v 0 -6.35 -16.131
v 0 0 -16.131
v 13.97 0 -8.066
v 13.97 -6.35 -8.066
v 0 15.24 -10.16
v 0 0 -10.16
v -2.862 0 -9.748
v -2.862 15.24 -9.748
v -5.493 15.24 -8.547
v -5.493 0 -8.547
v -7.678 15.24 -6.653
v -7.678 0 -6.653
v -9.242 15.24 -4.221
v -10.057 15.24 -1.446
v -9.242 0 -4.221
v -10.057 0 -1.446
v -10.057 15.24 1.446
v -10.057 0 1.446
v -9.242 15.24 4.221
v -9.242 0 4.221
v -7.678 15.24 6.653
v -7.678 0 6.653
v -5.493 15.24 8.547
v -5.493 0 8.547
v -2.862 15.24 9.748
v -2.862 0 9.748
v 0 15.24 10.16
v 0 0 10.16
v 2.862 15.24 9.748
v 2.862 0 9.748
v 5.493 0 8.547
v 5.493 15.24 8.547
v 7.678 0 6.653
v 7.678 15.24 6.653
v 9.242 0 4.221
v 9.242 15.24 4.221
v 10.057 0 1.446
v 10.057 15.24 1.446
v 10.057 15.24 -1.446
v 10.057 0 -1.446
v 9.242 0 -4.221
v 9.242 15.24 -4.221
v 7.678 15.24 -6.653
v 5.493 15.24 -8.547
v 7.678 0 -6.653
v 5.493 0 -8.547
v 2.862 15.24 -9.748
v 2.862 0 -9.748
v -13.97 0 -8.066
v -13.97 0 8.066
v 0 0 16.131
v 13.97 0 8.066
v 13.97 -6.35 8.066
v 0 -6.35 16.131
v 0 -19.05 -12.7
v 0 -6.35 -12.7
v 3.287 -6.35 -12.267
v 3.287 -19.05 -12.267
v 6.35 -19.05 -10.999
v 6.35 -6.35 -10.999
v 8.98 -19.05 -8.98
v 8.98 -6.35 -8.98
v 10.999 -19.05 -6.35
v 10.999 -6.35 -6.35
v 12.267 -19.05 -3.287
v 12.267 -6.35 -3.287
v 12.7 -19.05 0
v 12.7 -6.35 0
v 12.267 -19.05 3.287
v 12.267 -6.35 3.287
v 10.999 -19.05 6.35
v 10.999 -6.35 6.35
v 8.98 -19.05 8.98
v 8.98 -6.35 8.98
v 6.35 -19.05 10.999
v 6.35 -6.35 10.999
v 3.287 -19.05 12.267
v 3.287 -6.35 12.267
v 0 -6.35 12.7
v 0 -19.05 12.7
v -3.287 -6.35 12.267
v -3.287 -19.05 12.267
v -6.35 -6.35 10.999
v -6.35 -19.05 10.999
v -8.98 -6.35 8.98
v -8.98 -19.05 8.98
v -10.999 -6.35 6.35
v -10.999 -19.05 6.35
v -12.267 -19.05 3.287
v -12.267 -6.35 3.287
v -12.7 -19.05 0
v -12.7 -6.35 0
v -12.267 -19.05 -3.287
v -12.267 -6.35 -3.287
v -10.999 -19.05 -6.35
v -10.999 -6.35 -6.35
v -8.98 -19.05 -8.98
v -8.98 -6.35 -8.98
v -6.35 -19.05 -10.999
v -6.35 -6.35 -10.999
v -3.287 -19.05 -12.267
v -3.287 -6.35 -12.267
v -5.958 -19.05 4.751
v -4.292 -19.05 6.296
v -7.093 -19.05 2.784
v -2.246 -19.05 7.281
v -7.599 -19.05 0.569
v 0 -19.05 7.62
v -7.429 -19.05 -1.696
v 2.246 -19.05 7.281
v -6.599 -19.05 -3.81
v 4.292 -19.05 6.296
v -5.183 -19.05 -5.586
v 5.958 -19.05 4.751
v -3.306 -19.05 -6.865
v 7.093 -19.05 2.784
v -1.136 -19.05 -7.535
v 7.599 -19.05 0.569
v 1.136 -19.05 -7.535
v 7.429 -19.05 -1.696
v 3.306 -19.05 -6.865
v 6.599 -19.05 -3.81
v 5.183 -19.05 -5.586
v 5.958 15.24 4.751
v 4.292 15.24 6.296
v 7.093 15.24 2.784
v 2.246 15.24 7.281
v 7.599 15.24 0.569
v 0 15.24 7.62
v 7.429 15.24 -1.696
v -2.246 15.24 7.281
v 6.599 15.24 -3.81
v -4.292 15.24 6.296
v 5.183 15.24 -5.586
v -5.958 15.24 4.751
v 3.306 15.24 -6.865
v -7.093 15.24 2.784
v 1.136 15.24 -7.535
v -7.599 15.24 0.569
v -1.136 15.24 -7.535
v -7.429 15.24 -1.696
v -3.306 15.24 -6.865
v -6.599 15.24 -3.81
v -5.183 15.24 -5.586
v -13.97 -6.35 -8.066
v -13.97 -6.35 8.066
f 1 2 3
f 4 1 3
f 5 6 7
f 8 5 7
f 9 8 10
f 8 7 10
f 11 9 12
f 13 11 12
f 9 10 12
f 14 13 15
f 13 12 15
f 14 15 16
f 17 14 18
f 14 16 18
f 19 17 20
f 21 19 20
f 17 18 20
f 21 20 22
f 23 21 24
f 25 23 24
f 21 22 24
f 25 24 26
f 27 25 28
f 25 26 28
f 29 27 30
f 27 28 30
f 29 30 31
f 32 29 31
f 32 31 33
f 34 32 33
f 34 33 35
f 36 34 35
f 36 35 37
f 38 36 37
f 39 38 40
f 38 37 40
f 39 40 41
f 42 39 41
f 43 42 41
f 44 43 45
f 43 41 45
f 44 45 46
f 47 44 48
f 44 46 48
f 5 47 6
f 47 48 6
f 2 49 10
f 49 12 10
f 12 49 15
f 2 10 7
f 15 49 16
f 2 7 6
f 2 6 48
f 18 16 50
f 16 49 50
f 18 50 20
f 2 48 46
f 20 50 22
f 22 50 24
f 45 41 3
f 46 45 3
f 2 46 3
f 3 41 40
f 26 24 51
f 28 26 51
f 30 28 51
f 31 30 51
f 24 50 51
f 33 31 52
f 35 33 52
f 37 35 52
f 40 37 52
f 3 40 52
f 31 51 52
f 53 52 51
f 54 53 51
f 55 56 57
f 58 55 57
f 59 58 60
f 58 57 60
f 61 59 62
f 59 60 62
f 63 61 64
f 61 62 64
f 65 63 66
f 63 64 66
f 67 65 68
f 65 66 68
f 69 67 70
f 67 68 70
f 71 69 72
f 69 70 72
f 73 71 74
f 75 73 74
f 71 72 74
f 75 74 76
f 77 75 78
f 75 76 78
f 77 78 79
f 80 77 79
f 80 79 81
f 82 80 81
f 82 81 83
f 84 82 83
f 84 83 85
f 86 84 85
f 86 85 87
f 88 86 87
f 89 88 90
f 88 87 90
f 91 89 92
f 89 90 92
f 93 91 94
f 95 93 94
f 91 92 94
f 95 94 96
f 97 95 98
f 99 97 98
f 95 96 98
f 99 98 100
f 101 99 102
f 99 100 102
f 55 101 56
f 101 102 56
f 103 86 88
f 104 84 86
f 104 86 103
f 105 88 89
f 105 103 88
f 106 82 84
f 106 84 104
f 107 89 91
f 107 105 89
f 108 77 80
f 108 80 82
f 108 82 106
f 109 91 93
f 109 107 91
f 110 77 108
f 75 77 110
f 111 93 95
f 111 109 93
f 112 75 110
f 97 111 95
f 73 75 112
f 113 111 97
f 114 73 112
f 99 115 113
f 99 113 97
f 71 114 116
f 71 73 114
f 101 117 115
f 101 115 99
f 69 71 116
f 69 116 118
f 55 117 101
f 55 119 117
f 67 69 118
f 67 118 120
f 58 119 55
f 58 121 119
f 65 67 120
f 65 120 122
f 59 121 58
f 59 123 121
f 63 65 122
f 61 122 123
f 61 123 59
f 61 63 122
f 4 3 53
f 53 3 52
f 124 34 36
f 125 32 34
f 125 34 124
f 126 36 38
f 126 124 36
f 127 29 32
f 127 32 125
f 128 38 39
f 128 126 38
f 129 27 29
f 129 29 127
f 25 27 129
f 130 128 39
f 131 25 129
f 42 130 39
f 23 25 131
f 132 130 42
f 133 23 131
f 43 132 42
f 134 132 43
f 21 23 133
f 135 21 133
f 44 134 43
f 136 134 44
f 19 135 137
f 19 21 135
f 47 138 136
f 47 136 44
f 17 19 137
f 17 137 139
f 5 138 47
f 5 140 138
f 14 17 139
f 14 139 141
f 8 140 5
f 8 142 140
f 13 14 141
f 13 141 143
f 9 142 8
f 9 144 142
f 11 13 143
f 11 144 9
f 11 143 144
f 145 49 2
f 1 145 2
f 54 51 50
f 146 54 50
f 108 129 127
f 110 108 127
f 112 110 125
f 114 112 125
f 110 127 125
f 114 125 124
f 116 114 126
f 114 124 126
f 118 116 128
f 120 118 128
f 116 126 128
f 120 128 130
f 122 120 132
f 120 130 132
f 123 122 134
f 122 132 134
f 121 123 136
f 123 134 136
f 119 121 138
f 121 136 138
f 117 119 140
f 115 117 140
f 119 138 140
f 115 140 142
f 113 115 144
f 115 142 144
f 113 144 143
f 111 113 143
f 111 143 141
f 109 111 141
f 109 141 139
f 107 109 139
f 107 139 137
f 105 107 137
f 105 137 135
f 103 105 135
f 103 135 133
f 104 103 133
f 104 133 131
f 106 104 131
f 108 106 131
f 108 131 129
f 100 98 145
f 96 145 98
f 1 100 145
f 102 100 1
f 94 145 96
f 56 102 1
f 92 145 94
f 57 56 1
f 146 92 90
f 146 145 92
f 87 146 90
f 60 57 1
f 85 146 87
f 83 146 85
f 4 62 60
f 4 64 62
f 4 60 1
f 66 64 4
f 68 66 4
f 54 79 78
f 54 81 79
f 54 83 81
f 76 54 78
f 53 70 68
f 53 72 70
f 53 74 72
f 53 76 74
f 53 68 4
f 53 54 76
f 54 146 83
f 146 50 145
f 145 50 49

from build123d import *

# Parameters (mm, degrees)
SKETCH1_R           = 10.16
BOSS_EXTRUDE1_DEPTH = 15.24
BOSS_EXTRUDE2_DEPTH = 6.35
SKETCH3_R           = 12.7
BOSS_EXTRUDE3_DEPTH = 12.7
SKETCH4_R           = 7.62
CUT_EXTRUDE1_DEPTH  = 41.387863689


with BuildPart() as part:
    # Sketch1 → Boss-Extrude1 (new body)
    with BuildSketch(Plane(origin=(0, 0, 0), x_dir=(1, 0, 0), z_dir=(0, 1, 0))):
        with Locations(Location((0, 0, 0), (0, 0, 90))):
            Circle(SKETCH1_R)
    extrude(amount=BOSS_EXTRUDE1_DEPTH)

    # Sketch2 → Boss-Extrude2 (add)
    with BuildSketch(Plane.XZ):
        Polygon((-13.97, -8.065583261), (0, -16.131166521), (13.97, -8.065583261), (13.97, 8.065583261), (0, 16.131166521), (-13.97, 8.065583261), align=None)
    extrude(amount=BOSS_EXTRUDE2_DEPTH)

    # Sketch3 → Boss-Extrude3 (add)
    with BuildSketch(Plane.XZ.offset(6.35)):
        with Locations(Location((0, 0, 0), (0, 0, 270))):
            Circle(SKETCH3_R)
    extrude(amount=BOSS_EXTRUDE3_DEPTH)

    # Sketch4 → Cut-Extrude1 (cut, through all)
    with BuildSketch(Plane(origin=(0, 15.24, 0), x_dir=(1, 0, 0), z_dir=(0, 1, 0))):
        with Locations(Location((0, 0, 0), (0, 0, 270))):
            Circle(SKETCH4_R)
    extrude(amount=-CUT_EXTRUDE1_DEPTH, mode=Mode.SUBTRACT)


solid = part.part
